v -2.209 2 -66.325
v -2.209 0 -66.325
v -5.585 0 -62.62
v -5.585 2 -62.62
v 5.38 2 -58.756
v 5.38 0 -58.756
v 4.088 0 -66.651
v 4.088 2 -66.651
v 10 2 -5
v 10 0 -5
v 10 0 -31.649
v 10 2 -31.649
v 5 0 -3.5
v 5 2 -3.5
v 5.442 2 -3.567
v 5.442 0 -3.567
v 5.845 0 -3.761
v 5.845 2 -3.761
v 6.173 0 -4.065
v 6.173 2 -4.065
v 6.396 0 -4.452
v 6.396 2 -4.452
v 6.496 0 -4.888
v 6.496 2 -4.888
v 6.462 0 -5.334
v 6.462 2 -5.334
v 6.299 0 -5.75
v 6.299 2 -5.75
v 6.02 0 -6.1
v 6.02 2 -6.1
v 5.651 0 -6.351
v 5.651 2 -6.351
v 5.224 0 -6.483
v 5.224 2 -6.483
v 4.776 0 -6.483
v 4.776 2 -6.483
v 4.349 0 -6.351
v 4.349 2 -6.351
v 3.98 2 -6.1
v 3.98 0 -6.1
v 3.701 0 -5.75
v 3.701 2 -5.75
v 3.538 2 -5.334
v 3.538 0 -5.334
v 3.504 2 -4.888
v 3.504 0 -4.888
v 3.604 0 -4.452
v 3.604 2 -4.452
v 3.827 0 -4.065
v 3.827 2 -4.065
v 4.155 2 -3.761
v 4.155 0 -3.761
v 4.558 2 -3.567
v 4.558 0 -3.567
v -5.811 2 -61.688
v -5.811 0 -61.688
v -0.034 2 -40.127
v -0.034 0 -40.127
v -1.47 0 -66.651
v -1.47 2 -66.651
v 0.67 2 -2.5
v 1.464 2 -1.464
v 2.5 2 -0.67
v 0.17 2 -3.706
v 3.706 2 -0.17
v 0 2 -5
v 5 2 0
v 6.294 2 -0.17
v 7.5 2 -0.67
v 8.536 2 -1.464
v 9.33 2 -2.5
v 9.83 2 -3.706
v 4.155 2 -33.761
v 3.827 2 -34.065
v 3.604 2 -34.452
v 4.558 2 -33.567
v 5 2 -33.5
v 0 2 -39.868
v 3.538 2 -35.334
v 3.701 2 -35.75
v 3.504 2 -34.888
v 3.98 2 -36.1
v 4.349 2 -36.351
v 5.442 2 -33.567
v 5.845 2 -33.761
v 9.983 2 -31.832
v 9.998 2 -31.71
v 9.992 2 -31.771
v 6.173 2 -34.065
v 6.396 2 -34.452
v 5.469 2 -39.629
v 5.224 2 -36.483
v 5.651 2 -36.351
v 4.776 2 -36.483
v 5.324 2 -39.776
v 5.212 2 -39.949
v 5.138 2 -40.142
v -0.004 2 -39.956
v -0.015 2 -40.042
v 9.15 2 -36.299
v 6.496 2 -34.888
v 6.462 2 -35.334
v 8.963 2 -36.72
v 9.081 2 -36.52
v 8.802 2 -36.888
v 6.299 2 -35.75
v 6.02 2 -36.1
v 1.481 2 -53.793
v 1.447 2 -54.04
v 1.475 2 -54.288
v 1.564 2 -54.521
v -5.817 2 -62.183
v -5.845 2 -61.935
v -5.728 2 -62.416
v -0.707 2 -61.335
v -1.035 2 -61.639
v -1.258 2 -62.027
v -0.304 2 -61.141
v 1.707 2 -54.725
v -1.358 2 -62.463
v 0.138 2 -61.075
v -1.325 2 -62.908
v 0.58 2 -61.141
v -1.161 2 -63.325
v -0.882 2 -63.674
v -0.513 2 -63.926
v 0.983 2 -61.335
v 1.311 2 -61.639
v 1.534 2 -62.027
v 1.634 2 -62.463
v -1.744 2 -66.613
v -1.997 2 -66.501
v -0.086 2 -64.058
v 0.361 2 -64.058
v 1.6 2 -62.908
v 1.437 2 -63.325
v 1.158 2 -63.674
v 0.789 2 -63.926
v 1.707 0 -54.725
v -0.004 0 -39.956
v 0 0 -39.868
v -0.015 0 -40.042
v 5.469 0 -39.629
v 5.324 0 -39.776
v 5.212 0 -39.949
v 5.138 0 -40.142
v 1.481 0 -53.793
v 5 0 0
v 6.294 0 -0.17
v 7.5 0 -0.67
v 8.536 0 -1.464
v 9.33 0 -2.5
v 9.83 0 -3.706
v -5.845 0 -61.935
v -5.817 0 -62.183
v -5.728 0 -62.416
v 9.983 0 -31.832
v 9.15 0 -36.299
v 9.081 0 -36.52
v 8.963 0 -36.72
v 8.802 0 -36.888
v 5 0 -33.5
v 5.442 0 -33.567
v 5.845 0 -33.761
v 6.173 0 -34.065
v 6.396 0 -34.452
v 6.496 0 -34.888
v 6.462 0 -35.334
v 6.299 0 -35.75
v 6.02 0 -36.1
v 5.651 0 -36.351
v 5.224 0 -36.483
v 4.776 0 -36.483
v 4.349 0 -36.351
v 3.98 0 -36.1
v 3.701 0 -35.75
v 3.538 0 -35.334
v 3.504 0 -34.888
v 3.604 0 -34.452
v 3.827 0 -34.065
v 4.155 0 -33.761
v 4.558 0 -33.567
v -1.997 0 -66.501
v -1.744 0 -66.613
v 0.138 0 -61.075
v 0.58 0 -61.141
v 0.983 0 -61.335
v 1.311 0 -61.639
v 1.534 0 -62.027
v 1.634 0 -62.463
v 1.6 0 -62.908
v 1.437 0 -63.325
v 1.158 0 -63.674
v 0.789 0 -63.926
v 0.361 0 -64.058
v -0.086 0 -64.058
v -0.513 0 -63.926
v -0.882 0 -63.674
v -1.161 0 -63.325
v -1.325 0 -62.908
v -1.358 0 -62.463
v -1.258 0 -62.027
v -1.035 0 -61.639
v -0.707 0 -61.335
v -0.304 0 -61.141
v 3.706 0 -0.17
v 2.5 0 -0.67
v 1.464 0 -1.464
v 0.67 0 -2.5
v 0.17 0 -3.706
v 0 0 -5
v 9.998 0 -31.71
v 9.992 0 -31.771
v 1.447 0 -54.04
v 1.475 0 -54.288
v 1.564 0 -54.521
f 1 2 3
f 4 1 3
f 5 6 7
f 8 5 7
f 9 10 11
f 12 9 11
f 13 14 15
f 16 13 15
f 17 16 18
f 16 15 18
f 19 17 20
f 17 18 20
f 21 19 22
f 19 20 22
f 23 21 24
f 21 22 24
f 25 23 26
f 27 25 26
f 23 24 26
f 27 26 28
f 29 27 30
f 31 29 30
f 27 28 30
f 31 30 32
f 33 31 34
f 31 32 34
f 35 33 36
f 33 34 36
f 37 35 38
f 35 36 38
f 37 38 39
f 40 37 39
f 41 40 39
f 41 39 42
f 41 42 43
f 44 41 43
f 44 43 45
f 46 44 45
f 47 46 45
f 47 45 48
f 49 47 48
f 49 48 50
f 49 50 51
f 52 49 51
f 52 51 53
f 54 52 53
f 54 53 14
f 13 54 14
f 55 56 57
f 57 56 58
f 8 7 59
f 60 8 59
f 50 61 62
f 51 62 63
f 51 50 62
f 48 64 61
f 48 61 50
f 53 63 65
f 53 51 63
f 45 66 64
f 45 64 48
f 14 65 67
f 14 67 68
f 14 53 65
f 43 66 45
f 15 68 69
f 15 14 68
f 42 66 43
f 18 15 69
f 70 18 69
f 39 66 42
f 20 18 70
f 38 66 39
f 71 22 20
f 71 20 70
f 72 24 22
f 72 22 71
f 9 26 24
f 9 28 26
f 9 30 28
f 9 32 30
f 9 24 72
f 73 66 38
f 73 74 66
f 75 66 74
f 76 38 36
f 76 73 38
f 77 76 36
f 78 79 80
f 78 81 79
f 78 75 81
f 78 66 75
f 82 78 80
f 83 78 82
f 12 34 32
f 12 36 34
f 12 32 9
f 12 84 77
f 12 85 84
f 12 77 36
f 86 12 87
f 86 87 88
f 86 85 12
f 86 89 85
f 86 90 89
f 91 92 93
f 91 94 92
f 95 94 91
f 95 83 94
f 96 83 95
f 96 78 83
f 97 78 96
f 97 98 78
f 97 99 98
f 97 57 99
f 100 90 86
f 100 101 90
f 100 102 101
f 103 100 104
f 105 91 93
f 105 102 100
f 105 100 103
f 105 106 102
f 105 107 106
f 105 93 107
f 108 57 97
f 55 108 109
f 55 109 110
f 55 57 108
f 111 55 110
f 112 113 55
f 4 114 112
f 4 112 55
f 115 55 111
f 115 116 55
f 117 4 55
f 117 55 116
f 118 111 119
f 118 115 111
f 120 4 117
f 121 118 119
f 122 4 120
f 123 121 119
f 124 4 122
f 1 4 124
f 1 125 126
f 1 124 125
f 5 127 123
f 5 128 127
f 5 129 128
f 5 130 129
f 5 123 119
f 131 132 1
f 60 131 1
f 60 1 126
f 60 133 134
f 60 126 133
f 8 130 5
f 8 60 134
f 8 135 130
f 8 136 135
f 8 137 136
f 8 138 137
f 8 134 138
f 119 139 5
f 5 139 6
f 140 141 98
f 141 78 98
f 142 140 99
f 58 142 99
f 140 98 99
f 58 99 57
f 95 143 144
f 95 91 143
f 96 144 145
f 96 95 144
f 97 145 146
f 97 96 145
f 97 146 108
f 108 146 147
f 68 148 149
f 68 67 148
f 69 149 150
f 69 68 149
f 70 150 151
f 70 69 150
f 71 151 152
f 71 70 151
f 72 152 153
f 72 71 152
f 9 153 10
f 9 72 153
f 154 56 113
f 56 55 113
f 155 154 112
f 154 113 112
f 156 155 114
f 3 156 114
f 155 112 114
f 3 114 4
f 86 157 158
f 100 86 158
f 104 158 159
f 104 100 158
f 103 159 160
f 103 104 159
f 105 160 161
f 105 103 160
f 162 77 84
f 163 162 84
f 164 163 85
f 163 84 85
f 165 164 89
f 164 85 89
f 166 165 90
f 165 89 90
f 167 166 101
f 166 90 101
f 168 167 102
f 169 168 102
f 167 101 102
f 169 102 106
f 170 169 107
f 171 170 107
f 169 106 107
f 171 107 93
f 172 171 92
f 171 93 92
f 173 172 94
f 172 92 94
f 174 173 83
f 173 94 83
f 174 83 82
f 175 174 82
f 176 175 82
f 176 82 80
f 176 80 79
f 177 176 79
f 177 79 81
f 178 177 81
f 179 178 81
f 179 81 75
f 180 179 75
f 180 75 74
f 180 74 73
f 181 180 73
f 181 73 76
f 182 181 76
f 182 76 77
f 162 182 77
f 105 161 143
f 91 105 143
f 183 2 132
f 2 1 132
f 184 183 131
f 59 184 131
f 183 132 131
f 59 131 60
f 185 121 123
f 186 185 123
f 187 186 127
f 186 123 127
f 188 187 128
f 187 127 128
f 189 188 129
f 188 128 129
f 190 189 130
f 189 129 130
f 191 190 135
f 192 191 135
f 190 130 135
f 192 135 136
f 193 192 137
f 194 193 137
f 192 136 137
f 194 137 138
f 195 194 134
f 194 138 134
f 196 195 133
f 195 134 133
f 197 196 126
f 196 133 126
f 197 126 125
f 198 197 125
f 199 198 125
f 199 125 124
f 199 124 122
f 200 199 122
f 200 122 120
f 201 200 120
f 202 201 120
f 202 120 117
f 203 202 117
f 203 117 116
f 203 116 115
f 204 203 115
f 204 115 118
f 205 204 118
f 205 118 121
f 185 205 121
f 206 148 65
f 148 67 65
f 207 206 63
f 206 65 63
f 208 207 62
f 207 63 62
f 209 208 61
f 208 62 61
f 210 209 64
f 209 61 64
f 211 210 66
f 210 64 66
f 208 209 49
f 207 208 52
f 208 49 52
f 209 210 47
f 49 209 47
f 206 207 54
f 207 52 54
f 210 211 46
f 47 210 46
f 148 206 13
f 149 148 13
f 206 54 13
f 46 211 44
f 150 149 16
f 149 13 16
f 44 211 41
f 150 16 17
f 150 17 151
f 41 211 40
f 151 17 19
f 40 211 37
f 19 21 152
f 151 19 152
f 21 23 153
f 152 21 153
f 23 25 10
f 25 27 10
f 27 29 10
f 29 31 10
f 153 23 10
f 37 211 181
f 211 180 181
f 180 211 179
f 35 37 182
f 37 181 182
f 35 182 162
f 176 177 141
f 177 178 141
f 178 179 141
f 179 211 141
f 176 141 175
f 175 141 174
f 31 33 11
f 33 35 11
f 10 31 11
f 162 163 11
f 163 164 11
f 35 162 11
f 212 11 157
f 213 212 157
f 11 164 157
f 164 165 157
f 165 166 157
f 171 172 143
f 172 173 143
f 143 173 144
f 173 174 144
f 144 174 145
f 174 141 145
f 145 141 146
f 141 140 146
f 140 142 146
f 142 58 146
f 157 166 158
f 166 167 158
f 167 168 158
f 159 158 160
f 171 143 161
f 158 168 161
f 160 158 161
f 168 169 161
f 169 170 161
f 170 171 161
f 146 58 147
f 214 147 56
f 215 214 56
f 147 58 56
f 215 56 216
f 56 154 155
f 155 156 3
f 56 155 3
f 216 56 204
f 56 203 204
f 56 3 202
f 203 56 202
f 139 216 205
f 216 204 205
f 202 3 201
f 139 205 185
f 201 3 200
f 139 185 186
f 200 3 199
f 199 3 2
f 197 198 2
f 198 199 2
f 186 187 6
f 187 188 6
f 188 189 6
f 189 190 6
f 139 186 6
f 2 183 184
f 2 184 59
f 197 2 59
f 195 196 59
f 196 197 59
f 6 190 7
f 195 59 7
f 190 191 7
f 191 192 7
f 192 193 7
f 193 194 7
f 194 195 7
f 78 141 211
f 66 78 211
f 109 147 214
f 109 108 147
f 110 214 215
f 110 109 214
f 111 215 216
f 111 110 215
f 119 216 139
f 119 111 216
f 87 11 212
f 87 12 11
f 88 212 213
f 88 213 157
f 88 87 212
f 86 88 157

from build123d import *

# Parameters (mm, degrees)
BOSS_EXTRUDE1_DEPTH = 2
FILLET1_R           = 5
SKETCH2_R           = 1.5
CUT_EXTRUDE1_DEPTH  = 68.426998807
FILLET2_R           = 1


with BuildPart() as part:
    # Sketch1 → Boss-Extrude1 (new body)
    with BuildSketch(Plane(origin=(0, 0, 0), x_dir=(1, 0, 0), z_dir=(0, 1, 0))):
        Polygon((0, 0), (10, 0), (10, 31.741283677), (9.083107298, 36.656495551), (5.221289447, 39.832399027), (1.339003771, 54.321286421), (5.380096521, 58.756325247), (4.088254713, 66.65133283), (-1.911745287, 66.65133283), (-5.952838037, 62.216294005), (0, 40), align=None)
    extrude(amount=BOSS_EXTRUDE1_DEPTH)

    # Fillet1
    fillet1_edges = [part.edges().sort_by_distance(p)[0] for p in [
        (10, 1, 0),
        (0, 1, 0),
    ]]
    fillet(fillet1_edges, radius=FILLET1_R - 0.0001)  # a hair under: the kernel refuses the full size

    # Sketch2 → Cut-Extrude1 (cut, through all)
    with BuildSketch(Plane(origin=(0, 2, 0), x_dir=(1, 0, 0), z_dir=(0, 1, 0))):
        with Locations(Location((0.137851025, 62.574617084, 0), (0, 0, 270))):
            Circle(SKETCH2_R)
        with Locations(Location((5, 5, 0), (0, 0, 270))):
            Circle(SKETCH2_R)
        with Locations(Location((5, 35, 0), (0, 0, 270))):
            Circle(SKETCH2_R)
    extrude(amount=-CUT_EXTRUDE1_DEPTH, mode=Mode.SUBTRACT)

    # Fillet2
    fillet2_edges = [part.edges().sort_by_distance(p)[0] for p in [
        (9.083107298, 1, -36.656495551),
        (10, 1, -31.741283677),
        (0, 1, -40),
        (-5.952838037, 1, -62.216294005),
        (-1.911745287, 1, -66.65133283),
        (1.339003771, 1, -54.321286421),
        (5.221289447, 1, -39.832399027),
    ]]
    fillet(fillet2_edges, radius=FILLET2_R)


solid = part.part
